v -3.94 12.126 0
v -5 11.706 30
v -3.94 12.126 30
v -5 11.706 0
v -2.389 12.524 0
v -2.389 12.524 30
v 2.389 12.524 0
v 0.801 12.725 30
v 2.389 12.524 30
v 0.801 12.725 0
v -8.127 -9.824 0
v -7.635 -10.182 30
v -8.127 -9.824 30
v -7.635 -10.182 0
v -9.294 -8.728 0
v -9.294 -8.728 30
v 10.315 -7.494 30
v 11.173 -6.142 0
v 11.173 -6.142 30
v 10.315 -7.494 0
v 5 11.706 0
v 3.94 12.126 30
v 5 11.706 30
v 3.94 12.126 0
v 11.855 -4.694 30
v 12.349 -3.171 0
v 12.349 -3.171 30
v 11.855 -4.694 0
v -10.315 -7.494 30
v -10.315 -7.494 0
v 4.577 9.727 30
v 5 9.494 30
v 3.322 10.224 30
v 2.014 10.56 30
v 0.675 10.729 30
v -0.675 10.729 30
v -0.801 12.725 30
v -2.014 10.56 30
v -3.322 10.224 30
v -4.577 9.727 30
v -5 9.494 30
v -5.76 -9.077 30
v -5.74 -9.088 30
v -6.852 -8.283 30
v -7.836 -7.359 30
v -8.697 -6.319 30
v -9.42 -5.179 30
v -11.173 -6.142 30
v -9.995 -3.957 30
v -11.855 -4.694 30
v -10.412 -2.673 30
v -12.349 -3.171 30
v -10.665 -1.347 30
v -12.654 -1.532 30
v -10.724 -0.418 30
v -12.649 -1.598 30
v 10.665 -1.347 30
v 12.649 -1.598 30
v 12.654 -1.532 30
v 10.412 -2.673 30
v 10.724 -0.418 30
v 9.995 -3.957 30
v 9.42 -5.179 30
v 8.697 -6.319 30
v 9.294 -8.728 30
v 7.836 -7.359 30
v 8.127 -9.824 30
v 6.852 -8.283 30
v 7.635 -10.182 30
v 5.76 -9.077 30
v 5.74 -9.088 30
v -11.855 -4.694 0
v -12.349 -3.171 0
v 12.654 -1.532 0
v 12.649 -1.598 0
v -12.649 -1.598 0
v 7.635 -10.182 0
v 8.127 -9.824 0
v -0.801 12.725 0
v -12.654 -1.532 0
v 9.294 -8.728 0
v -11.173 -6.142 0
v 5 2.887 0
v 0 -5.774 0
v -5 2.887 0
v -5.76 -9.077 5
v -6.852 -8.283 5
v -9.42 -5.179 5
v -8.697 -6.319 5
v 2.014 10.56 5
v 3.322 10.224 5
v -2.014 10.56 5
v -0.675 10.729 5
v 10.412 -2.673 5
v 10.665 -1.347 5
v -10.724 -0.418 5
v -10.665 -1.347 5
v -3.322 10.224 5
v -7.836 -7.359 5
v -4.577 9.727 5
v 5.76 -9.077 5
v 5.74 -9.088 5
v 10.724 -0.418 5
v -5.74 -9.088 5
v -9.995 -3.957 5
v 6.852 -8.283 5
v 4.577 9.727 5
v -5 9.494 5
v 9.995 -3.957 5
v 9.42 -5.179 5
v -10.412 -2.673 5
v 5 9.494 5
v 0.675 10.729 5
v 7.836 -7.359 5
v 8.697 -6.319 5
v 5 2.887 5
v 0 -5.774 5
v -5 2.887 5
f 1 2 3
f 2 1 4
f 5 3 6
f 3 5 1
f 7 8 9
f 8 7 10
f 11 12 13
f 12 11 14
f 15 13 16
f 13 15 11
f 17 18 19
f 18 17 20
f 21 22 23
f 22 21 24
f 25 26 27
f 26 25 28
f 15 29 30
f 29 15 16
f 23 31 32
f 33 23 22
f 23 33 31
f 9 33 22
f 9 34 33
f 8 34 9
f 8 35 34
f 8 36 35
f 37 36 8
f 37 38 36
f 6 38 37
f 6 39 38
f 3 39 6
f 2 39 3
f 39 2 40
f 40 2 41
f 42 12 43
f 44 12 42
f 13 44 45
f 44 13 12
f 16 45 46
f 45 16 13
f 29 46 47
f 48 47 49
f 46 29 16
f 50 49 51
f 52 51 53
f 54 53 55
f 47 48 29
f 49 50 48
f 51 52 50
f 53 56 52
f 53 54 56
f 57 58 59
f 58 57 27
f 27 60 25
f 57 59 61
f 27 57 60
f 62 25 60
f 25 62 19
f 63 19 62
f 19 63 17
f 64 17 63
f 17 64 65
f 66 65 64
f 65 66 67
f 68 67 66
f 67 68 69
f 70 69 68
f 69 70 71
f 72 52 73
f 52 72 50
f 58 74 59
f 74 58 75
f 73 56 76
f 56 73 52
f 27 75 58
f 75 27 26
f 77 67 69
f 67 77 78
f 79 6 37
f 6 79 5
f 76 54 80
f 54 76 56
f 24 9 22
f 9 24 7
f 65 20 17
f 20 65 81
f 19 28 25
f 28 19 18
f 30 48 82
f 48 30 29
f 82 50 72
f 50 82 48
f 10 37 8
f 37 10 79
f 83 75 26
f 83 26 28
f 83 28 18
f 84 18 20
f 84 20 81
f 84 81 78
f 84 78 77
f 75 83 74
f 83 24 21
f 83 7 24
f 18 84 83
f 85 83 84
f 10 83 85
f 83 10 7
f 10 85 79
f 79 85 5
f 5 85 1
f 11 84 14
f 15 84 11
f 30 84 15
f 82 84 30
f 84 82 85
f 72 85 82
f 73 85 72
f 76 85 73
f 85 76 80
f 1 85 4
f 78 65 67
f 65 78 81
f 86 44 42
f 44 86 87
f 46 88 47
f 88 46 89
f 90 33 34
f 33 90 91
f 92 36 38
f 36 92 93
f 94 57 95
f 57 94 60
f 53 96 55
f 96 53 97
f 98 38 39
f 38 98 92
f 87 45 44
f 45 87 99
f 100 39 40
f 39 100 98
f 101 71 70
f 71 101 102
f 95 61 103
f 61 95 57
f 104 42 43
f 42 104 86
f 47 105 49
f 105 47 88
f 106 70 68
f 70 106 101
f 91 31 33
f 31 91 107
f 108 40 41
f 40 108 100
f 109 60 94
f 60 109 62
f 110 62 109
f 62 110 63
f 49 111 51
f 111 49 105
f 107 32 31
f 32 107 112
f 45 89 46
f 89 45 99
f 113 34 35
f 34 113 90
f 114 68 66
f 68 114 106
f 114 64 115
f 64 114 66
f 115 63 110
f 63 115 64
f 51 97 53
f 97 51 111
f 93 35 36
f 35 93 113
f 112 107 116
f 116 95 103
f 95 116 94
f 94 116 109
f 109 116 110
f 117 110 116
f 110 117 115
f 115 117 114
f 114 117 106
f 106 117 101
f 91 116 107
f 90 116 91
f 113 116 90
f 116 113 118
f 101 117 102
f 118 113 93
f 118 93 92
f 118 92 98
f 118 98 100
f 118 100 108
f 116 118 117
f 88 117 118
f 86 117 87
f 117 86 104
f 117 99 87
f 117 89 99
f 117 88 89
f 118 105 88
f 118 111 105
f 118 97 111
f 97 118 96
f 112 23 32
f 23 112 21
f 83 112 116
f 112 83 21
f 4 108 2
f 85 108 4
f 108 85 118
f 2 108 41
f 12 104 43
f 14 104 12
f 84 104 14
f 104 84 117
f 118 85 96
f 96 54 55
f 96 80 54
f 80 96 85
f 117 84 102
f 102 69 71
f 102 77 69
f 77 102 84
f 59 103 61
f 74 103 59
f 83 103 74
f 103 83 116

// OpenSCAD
include <MCAD/units.scad>

/* [Stand] */

// Leg center angles in degrees
legCenterAngles = [0, 120, 240];
// Width of the legs (the chord length)
legWidth = 10;
// Leg segment lengths (innermost segment first, value 0 = placeholder)
legSegmentLengths = [10.75, 2, 0, 0, 0];
// Leg segment heights (innermost segment first, same vector size as legSegmentLengths)
legSegmentHeights = [5, 30, 0, 0, 0];

/* [Hidden] */

$fn = 50;

function add(v, i = 0, imax = 1e200) = i < len(v) - 1 && i < imax ? v[i] + add(v, i + 1, imax) : v[i];

module Stand() {
    intersection() {
        for (i = [0:len(legSegmentLengths) - 1])
            if (legSegmentLengths[i] > 0)
                difference() {
                    cylinder(legSegmentHeights[i], r = add(legSegmentLengths, 0, i));
                    if (i > 0)
                        translate([0, 0, -epsilon])
                        cylinder(legSegmentHeights[i] + epsilon * 3, r = add(legSegmentLengths, 0, i - 1));
                }
        for (a = legCenterAngles)
            rotate([0, 0, a])
            translate([-legWidth / 2, 0, -epsilon])
            cube([legWidth, add(legSegmentLengths) + epsilon, max(legSegmentHeights) + epsilon * 2]);
    }
}

Stand();
